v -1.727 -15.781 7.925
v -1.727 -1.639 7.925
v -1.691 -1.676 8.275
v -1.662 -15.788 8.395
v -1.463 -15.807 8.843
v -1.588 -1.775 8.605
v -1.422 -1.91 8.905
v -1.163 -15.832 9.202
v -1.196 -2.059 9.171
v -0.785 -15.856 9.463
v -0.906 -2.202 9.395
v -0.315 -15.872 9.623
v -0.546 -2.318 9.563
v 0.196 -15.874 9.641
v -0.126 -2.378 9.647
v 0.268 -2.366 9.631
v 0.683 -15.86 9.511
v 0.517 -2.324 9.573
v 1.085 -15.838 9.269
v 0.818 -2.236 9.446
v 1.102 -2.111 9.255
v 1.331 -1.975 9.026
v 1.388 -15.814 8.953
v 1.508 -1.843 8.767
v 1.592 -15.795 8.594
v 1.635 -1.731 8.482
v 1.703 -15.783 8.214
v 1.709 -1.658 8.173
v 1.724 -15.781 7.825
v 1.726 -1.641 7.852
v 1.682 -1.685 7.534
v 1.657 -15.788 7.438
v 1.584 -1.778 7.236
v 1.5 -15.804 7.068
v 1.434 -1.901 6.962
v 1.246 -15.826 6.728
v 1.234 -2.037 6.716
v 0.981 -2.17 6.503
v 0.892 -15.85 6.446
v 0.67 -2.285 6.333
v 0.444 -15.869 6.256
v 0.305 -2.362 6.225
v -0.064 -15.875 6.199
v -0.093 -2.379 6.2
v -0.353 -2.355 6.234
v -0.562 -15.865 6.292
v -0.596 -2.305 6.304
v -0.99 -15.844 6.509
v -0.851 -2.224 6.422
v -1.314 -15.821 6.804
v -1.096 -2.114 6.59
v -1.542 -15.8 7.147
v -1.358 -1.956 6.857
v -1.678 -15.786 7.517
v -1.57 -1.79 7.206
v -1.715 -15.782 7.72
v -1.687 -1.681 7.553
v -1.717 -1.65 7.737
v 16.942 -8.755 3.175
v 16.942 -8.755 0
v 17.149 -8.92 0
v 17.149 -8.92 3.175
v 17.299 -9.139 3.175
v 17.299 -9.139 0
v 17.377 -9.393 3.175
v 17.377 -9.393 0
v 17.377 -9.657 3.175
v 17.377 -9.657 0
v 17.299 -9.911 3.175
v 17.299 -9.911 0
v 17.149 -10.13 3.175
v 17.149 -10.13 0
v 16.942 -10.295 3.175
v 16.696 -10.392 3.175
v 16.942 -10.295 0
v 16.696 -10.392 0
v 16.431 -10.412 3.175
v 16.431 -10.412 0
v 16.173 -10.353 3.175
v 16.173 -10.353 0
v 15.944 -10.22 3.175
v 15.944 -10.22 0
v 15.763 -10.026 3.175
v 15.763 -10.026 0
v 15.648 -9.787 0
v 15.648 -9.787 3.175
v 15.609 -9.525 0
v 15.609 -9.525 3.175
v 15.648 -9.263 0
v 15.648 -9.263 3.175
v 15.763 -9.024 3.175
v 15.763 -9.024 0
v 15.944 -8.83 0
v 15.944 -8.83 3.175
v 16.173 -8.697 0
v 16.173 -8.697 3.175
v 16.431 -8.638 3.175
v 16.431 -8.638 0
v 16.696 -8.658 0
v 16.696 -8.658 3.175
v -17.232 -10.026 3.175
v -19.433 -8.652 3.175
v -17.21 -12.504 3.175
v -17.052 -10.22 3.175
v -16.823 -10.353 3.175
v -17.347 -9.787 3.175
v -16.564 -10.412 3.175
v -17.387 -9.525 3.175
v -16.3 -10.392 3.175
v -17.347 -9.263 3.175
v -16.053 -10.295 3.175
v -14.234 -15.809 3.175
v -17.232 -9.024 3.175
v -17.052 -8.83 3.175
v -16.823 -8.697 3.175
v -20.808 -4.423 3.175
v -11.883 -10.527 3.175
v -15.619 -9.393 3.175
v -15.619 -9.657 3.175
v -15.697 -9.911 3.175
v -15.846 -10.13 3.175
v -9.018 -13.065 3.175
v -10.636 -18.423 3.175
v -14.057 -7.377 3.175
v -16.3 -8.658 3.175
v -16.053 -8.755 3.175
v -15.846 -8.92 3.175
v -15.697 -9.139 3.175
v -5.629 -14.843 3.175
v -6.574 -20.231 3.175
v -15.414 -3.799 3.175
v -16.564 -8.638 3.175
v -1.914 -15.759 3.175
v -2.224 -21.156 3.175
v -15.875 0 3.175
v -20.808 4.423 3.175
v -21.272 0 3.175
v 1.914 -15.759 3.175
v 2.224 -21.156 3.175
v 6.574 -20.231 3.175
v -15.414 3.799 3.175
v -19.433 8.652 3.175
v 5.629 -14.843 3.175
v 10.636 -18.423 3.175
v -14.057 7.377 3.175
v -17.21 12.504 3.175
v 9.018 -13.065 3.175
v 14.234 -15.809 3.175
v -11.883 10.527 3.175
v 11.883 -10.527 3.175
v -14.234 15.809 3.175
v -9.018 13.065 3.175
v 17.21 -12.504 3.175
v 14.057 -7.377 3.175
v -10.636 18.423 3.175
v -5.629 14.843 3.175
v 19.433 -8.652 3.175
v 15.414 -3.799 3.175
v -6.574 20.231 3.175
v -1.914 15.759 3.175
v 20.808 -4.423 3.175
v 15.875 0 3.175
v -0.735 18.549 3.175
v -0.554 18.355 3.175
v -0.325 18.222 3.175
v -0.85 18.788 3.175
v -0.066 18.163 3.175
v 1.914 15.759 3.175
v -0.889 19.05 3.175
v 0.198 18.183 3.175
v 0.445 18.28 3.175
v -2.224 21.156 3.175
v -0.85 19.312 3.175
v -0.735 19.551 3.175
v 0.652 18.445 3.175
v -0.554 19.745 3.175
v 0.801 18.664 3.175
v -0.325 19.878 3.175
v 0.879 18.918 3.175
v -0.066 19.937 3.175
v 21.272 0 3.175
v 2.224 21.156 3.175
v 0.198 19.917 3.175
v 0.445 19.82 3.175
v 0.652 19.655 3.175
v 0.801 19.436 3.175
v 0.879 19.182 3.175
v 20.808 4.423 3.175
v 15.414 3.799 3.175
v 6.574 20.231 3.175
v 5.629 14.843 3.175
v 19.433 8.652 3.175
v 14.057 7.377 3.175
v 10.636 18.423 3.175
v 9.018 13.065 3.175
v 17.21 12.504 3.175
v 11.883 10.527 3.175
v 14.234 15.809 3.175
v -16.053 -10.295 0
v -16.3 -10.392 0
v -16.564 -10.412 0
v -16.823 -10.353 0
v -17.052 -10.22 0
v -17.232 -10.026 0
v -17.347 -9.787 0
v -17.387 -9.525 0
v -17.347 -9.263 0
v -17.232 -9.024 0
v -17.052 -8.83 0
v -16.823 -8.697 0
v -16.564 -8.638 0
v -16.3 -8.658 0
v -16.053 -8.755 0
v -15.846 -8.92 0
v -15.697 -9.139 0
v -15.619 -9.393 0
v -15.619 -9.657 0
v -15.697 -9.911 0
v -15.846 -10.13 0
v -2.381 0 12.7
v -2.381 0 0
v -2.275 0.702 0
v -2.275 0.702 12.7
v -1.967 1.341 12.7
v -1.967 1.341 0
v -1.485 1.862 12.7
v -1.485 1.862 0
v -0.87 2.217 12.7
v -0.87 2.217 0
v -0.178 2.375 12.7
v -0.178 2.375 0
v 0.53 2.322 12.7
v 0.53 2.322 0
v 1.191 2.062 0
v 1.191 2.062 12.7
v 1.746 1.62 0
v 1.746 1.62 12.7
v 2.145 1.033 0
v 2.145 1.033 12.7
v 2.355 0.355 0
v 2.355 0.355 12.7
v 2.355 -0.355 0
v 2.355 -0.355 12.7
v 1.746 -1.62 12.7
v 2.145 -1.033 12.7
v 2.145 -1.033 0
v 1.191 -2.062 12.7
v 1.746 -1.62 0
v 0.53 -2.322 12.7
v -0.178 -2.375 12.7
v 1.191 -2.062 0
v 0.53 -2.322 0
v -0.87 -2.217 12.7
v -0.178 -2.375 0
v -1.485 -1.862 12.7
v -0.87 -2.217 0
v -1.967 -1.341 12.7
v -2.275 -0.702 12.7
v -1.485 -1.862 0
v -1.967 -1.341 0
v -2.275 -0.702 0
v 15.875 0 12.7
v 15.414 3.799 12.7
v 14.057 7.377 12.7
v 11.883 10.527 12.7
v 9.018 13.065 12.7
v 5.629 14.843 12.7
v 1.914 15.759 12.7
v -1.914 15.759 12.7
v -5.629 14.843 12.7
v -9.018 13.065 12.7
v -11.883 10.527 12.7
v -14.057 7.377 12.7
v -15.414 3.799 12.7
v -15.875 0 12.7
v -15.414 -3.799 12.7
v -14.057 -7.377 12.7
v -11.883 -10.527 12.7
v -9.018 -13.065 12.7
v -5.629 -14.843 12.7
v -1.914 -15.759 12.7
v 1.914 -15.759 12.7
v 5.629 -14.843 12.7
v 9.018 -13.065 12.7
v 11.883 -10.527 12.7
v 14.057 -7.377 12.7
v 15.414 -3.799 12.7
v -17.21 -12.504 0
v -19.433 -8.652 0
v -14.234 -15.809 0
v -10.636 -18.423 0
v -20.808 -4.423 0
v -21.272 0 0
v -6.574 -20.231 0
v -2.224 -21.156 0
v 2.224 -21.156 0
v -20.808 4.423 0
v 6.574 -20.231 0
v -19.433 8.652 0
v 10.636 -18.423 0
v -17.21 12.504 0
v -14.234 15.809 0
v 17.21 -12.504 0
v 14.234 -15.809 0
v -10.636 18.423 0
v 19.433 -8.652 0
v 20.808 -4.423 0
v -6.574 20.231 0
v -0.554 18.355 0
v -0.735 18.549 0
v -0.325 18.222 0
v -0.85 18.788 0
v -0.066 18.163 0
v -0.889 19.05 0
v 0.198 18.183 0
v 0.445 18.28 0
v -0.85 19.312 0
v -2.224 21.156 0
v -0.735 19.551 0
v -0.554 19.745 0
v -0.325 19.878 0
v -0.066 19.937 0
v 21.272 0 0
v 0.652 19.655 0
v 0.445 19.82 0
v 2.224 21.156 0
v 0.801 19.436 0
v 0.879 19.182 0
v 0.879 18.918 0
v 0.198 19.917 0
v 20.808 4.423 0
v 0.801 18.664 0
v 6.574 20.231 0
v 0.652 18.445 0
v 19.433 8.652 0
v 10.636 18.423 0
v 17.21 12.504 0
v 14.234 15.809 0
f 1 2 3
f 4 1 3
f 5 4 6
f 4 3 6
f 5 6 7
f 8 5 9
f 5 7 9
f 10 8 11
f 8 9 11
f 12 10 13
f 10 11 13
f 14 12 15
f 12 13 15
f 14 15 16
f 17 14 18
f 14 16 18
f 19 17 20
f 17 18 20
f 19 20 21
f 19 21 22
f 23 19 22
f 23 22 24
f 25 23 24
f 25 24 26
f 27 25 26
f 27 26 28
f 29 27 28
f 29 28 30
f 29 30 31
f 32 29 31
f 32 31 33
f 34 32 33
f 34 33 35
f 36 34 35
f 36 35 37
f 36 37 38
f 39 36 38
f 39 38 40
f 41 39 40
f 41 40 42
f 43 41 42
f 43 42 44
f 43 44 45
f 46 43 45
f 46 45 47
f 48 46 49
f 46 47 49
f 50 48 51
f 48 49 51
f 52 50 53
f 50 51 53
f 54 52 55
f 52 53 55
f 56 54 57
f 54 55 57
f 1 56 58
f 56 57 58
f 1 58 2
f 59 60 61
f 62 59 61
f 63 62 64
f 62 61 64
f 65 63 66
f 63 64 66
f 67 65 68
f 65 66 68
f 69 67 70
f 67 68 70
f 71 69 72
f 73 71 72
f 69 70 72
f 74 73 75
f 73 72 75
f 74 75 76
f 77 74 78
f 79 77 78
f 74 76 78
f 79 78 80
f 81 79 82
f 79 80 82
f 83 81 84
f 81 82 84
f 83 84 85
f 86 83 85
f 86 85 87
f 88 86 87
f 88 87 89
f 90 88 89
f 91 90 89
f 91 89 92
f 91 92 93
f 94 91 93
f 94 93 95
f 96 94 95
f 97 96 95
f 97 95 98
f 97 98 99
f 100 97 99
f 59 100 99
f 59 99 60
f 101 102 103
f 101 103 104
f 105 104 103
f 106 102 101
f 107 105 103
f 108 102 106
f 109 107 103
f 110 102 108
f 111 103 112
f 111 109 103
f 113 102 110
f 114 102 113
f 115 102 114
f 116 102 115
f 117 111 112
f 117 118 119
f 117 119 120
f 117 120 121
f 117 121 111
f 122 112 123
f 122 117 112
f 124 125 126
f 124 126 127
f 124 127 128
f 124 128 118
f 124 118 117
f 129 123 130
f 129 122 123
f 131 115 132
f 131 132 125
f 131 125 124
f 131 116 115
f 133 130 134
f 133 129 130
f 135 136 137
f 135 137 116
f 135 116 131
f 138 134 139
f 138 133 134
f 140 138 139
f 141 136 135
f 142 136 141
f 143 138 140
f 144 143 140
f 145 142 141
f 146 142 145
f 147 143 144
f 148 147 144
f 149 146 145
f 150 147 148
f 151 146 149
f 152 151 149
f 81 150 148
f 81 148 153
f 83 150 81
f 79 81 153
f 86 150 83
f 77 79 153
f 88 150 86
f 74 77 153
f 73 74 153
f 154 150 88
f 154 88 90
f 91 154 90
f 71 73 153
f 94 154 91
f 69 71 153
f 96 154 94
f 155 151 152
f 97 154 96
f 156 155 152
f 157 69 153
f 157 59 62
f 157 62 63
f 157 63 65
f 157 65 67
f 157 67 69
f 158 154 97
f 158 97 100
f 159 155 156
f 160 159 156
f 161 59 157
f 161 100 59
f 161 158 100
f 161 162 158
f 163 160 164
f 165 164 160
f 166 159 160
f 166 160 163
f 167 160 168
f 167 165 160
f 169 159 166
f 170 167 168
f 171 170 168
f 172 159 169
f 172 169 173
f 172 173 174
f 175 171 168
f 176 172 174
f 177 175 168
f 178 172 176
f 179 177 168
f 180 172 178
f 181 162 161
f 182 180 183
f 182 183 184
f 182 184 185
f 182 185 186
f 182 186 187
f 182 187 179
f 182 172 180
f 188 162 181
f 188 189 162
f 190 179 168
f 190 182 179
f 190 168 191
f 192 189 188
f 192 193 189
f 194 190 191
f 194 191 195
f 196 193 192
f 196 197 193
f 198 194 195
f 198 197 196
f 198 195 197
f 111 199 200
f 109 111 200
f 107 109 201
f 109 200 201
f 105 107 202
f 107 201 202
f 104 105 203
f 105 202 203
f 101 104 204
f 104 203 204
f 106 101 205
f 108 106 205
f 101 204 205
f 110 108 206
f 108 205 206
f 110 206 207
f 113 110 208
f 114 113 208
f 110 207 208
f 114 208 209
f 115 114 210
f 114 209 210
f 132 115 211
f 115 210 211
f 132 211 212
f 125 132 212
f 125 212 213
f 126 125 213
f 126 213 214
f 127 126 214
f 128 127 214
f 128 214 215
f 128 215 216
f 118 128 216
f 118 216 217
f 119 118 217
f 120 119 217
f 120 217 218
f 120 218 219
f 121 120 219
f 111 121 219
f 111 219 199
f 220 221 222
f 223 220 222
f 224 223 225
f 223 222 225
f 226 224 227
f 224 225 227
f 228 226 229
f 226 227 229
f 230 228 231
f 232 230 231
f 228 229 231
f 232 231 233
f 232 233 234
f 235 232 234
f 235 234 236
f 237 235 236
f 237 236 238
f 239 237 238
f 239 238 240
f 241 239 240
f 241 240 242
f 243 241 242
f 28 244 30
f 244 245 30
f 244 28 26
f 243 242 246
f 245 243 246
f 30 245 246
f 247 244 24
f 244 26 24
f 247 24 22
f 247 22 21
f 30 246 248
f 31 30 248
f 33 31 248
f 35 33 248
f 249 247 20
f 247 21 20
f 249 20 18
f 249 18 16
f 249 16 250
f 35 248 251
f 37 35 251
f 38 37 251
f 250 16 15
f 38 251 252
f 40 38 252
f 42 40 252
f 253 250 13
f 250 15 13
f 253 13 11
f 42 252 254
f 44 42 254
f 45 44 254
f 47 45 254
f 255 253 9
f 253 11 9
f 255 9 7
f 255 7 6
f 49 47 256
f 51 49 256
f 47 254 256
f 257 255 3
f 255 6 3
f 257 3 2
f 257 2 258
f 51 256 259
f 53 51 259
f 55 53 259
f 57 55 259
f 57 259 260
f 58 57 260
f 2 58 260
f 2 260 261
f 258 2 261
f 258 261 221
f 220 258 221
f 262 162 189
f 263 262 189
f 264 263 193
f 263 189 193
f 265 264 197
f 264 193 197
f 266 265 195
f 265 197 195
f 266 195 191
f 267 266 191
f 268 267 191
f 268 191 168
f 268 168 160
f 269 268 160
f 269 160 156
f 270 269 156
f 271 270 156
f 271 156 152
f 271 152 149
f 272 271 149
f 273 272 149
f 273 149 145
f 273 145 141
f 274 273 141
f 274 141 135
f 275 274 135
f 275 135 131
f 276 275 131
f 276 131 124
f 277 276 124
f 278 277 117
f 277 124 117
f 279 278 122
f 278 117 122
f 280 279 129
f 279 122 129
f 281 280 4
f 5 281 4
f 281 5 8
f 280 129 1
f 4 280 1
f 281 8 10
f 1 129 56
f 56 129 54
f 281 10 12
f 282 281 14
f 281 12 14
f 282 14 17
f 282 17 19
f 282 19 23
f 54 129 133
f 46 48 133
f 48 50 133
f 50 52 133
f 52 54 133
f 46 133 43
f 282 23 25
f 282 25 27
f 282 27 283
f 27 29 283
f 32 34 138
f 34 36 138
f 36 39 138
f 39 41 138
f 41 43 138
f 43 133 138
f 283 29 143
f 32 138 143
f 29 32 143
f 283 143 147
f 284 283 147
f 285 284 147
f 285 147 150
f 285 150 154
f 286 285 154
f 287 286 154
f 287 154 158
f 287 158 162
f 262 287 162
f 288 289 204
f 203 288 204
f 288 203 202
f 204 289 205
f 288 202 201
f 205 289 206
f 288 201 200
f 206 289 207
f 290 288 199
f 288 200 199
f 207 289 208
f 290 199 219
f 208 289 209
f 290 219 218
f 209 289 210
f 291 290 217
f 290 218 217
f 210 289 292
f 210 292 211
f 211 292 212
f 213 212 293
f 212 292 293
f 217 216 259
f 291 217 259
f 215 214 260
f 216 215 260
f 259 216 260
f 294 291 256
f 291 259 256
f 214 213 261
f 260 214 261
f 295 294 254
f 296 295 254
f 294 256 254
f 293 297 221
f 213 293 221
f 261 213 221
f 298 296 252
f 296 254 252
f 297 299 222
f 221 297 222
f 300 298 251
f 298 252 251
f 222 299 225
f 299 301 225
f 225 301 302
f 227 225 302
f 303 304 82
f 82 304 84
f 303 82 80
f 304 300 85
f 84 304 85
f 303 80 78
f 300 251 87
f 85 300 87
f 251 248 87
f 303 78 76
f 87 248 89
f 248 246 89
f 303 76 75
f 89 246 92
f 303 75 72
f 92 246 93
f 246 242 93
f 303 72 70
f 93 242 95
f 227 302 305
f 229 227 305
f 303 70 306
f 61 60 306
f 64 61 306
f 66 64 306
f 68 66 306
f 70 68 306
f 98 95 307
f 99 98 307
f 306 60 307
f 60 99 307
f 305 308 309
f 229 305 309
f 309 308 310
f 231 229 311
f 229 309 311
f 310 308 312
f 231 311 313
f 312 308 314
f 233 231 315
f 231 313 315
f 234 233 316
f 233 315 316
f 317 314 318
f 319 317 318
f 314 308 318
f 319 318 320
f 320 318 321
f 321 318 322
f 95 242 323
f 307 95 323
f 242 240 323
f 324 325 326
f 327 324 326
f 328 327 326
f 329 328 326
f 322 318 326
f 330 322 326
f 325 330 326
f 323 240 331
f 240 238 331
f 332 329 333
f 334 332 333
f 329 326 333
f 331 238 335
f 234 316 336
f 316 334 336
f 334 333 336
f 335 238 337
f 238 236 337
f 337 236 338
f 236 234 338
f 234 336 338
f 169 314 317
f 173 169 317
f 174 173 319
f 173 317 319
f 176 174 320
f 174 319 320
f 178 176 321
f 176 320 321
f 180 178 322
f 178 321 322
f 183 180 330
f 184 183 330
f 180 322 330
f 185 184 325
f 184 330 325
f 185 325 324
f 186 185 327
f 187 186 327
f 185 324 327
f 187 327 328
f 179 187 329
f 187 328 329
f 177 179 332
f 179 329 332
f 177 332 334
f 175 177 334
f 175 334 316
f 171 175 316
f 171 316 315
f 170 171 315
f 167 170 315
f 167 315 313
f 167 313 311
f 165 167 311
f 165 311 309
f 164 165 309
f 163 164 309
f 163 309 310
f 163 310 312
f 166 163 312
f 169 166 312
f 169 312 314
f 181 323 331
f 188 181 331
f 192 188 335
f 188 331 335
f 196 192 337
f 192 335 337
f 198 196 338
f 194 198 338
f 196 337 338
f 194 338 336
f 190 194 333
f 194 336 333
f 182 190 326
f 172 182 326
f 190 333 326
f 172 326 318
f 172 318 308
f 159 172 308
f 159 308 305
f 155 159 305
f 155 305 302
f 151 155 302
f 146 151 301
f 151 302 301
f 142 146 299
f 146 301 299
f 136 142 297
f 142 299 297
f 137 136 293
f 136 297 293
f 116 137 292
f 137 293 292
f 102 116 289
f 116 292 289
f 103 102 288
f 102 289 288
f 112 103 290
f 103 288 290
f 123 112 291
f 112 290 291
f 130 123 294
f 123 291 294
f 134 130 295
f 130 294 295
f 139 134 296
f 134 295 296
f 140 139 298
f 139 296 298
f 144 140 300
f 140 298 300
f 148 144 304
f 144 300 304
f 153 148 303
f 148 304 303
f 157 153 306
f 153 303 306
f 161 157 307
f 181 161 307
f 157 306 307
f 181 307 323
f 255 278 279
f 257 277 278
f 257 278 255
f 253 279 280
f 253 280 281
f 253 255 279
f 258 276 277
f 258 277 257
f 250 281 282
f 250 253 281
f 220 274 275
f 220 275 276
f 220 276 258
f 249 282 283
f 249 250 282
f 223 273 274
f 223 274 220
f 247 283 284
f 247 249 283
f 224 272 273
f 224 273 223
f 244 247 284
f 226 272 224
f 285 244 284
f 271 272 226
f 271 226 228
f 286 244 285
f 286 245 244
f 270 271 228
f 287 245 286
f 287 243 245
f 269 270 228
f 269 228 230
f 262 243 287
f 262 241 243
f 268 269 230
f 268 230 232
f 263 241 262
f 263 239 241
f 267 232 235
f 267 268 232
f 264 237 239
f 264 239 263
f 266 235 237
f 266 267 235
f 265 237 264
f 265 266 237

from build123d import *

# Parameters (mm, degrees)
SKETCH1_R                      = 21.2725
BOSS_EXTRUDE1_DEPTH            = 3.175
SKETCH2_R                      = 15.875
BOSS_EXTRUDE2_DEPTH            = 9.525
F_3_16_0_1875_DIAMETER_HOLE1_D = 4.7625
F_2_56_TAPPED_HOLE3_D          = 1.778
CIRPATTERN1_COUNT              = 3
F_8_32_TAPPED_HOLE1_D          = 3.4544
F_8_32_TAPPED_HOLE1_DEPTH      = 21.2715
F_8_32_TAPPED_HOLE1_TIP        = 1.037806461


with BuildPart() as part:
    # Sketch1 → Boss-Extrude1 (new body)
    with BuildSketch(Plane.XY):
        Circle(SKETCH1_R)
    extrude(amount=BOSS_EXTRUDE1_DEPTH)

    # Sketch2 → Boss-Extrude2 (add)
    with BuildSketch(Plane.XY.offset(3.175)):
        Circle(SKETCH2_R)
    extrude(amount=BOSS_EXTRUDE2_DEPTH)

    # 3/16 (0.1875) Diameter Hole1 (through all)
    with Locations(Plane.XY.offset(12.7)):
        with Locations((0, 0)):
            Hole(F_3_16_0_1875_DIAMETER_HOLE1_D / 2)

    # #2-56 Tapped Hole3 (through all)
    with Locations(Plane.XY.offset(3.175)):
        with Locations((0, 19.05)):
            f_2_56_tapped_hole3 = Hole(F_2_56_TAPPED_HOLE3_D / 2)

    # CirPattern1: #2-56 Tapped Hole3 ×3 about axis
    cirpattern1_axis = Axis((0, 0, 0), (0, 0, 1))
    for i in range(1, CIRPATTERN1_COUNT):
        add(f_2_56_tapped_hole3.rotate(cirpattern1_axis, i * 360 / CIRPATTERN1_COUNT), mode=Mode.SUBTRACT)

    # #8-32 Tapped Hole1
    with Locations(Plane.XZ.offset(21.2725)):
        with Locations((0, 7.9248)):
            Hole(F_8_32_TAPPED_HOLE1_D / 2, depth=F_8_32_TAPPED_HOLE1_DEPTH)
            with Locations((0, 0, -(F_8_32_TAPPED_HOLE1_DEPTH + F_8_32_TAPPED_HOLE1_TIP / 2))):  # 118° drill point
                Cone(0, F_8_32_TAPPED_HOLE1_D / 2, F_8_32_TAPPED_HOLE1_TIP, mode=Mode.SUBTRACT)


solid = part.part
